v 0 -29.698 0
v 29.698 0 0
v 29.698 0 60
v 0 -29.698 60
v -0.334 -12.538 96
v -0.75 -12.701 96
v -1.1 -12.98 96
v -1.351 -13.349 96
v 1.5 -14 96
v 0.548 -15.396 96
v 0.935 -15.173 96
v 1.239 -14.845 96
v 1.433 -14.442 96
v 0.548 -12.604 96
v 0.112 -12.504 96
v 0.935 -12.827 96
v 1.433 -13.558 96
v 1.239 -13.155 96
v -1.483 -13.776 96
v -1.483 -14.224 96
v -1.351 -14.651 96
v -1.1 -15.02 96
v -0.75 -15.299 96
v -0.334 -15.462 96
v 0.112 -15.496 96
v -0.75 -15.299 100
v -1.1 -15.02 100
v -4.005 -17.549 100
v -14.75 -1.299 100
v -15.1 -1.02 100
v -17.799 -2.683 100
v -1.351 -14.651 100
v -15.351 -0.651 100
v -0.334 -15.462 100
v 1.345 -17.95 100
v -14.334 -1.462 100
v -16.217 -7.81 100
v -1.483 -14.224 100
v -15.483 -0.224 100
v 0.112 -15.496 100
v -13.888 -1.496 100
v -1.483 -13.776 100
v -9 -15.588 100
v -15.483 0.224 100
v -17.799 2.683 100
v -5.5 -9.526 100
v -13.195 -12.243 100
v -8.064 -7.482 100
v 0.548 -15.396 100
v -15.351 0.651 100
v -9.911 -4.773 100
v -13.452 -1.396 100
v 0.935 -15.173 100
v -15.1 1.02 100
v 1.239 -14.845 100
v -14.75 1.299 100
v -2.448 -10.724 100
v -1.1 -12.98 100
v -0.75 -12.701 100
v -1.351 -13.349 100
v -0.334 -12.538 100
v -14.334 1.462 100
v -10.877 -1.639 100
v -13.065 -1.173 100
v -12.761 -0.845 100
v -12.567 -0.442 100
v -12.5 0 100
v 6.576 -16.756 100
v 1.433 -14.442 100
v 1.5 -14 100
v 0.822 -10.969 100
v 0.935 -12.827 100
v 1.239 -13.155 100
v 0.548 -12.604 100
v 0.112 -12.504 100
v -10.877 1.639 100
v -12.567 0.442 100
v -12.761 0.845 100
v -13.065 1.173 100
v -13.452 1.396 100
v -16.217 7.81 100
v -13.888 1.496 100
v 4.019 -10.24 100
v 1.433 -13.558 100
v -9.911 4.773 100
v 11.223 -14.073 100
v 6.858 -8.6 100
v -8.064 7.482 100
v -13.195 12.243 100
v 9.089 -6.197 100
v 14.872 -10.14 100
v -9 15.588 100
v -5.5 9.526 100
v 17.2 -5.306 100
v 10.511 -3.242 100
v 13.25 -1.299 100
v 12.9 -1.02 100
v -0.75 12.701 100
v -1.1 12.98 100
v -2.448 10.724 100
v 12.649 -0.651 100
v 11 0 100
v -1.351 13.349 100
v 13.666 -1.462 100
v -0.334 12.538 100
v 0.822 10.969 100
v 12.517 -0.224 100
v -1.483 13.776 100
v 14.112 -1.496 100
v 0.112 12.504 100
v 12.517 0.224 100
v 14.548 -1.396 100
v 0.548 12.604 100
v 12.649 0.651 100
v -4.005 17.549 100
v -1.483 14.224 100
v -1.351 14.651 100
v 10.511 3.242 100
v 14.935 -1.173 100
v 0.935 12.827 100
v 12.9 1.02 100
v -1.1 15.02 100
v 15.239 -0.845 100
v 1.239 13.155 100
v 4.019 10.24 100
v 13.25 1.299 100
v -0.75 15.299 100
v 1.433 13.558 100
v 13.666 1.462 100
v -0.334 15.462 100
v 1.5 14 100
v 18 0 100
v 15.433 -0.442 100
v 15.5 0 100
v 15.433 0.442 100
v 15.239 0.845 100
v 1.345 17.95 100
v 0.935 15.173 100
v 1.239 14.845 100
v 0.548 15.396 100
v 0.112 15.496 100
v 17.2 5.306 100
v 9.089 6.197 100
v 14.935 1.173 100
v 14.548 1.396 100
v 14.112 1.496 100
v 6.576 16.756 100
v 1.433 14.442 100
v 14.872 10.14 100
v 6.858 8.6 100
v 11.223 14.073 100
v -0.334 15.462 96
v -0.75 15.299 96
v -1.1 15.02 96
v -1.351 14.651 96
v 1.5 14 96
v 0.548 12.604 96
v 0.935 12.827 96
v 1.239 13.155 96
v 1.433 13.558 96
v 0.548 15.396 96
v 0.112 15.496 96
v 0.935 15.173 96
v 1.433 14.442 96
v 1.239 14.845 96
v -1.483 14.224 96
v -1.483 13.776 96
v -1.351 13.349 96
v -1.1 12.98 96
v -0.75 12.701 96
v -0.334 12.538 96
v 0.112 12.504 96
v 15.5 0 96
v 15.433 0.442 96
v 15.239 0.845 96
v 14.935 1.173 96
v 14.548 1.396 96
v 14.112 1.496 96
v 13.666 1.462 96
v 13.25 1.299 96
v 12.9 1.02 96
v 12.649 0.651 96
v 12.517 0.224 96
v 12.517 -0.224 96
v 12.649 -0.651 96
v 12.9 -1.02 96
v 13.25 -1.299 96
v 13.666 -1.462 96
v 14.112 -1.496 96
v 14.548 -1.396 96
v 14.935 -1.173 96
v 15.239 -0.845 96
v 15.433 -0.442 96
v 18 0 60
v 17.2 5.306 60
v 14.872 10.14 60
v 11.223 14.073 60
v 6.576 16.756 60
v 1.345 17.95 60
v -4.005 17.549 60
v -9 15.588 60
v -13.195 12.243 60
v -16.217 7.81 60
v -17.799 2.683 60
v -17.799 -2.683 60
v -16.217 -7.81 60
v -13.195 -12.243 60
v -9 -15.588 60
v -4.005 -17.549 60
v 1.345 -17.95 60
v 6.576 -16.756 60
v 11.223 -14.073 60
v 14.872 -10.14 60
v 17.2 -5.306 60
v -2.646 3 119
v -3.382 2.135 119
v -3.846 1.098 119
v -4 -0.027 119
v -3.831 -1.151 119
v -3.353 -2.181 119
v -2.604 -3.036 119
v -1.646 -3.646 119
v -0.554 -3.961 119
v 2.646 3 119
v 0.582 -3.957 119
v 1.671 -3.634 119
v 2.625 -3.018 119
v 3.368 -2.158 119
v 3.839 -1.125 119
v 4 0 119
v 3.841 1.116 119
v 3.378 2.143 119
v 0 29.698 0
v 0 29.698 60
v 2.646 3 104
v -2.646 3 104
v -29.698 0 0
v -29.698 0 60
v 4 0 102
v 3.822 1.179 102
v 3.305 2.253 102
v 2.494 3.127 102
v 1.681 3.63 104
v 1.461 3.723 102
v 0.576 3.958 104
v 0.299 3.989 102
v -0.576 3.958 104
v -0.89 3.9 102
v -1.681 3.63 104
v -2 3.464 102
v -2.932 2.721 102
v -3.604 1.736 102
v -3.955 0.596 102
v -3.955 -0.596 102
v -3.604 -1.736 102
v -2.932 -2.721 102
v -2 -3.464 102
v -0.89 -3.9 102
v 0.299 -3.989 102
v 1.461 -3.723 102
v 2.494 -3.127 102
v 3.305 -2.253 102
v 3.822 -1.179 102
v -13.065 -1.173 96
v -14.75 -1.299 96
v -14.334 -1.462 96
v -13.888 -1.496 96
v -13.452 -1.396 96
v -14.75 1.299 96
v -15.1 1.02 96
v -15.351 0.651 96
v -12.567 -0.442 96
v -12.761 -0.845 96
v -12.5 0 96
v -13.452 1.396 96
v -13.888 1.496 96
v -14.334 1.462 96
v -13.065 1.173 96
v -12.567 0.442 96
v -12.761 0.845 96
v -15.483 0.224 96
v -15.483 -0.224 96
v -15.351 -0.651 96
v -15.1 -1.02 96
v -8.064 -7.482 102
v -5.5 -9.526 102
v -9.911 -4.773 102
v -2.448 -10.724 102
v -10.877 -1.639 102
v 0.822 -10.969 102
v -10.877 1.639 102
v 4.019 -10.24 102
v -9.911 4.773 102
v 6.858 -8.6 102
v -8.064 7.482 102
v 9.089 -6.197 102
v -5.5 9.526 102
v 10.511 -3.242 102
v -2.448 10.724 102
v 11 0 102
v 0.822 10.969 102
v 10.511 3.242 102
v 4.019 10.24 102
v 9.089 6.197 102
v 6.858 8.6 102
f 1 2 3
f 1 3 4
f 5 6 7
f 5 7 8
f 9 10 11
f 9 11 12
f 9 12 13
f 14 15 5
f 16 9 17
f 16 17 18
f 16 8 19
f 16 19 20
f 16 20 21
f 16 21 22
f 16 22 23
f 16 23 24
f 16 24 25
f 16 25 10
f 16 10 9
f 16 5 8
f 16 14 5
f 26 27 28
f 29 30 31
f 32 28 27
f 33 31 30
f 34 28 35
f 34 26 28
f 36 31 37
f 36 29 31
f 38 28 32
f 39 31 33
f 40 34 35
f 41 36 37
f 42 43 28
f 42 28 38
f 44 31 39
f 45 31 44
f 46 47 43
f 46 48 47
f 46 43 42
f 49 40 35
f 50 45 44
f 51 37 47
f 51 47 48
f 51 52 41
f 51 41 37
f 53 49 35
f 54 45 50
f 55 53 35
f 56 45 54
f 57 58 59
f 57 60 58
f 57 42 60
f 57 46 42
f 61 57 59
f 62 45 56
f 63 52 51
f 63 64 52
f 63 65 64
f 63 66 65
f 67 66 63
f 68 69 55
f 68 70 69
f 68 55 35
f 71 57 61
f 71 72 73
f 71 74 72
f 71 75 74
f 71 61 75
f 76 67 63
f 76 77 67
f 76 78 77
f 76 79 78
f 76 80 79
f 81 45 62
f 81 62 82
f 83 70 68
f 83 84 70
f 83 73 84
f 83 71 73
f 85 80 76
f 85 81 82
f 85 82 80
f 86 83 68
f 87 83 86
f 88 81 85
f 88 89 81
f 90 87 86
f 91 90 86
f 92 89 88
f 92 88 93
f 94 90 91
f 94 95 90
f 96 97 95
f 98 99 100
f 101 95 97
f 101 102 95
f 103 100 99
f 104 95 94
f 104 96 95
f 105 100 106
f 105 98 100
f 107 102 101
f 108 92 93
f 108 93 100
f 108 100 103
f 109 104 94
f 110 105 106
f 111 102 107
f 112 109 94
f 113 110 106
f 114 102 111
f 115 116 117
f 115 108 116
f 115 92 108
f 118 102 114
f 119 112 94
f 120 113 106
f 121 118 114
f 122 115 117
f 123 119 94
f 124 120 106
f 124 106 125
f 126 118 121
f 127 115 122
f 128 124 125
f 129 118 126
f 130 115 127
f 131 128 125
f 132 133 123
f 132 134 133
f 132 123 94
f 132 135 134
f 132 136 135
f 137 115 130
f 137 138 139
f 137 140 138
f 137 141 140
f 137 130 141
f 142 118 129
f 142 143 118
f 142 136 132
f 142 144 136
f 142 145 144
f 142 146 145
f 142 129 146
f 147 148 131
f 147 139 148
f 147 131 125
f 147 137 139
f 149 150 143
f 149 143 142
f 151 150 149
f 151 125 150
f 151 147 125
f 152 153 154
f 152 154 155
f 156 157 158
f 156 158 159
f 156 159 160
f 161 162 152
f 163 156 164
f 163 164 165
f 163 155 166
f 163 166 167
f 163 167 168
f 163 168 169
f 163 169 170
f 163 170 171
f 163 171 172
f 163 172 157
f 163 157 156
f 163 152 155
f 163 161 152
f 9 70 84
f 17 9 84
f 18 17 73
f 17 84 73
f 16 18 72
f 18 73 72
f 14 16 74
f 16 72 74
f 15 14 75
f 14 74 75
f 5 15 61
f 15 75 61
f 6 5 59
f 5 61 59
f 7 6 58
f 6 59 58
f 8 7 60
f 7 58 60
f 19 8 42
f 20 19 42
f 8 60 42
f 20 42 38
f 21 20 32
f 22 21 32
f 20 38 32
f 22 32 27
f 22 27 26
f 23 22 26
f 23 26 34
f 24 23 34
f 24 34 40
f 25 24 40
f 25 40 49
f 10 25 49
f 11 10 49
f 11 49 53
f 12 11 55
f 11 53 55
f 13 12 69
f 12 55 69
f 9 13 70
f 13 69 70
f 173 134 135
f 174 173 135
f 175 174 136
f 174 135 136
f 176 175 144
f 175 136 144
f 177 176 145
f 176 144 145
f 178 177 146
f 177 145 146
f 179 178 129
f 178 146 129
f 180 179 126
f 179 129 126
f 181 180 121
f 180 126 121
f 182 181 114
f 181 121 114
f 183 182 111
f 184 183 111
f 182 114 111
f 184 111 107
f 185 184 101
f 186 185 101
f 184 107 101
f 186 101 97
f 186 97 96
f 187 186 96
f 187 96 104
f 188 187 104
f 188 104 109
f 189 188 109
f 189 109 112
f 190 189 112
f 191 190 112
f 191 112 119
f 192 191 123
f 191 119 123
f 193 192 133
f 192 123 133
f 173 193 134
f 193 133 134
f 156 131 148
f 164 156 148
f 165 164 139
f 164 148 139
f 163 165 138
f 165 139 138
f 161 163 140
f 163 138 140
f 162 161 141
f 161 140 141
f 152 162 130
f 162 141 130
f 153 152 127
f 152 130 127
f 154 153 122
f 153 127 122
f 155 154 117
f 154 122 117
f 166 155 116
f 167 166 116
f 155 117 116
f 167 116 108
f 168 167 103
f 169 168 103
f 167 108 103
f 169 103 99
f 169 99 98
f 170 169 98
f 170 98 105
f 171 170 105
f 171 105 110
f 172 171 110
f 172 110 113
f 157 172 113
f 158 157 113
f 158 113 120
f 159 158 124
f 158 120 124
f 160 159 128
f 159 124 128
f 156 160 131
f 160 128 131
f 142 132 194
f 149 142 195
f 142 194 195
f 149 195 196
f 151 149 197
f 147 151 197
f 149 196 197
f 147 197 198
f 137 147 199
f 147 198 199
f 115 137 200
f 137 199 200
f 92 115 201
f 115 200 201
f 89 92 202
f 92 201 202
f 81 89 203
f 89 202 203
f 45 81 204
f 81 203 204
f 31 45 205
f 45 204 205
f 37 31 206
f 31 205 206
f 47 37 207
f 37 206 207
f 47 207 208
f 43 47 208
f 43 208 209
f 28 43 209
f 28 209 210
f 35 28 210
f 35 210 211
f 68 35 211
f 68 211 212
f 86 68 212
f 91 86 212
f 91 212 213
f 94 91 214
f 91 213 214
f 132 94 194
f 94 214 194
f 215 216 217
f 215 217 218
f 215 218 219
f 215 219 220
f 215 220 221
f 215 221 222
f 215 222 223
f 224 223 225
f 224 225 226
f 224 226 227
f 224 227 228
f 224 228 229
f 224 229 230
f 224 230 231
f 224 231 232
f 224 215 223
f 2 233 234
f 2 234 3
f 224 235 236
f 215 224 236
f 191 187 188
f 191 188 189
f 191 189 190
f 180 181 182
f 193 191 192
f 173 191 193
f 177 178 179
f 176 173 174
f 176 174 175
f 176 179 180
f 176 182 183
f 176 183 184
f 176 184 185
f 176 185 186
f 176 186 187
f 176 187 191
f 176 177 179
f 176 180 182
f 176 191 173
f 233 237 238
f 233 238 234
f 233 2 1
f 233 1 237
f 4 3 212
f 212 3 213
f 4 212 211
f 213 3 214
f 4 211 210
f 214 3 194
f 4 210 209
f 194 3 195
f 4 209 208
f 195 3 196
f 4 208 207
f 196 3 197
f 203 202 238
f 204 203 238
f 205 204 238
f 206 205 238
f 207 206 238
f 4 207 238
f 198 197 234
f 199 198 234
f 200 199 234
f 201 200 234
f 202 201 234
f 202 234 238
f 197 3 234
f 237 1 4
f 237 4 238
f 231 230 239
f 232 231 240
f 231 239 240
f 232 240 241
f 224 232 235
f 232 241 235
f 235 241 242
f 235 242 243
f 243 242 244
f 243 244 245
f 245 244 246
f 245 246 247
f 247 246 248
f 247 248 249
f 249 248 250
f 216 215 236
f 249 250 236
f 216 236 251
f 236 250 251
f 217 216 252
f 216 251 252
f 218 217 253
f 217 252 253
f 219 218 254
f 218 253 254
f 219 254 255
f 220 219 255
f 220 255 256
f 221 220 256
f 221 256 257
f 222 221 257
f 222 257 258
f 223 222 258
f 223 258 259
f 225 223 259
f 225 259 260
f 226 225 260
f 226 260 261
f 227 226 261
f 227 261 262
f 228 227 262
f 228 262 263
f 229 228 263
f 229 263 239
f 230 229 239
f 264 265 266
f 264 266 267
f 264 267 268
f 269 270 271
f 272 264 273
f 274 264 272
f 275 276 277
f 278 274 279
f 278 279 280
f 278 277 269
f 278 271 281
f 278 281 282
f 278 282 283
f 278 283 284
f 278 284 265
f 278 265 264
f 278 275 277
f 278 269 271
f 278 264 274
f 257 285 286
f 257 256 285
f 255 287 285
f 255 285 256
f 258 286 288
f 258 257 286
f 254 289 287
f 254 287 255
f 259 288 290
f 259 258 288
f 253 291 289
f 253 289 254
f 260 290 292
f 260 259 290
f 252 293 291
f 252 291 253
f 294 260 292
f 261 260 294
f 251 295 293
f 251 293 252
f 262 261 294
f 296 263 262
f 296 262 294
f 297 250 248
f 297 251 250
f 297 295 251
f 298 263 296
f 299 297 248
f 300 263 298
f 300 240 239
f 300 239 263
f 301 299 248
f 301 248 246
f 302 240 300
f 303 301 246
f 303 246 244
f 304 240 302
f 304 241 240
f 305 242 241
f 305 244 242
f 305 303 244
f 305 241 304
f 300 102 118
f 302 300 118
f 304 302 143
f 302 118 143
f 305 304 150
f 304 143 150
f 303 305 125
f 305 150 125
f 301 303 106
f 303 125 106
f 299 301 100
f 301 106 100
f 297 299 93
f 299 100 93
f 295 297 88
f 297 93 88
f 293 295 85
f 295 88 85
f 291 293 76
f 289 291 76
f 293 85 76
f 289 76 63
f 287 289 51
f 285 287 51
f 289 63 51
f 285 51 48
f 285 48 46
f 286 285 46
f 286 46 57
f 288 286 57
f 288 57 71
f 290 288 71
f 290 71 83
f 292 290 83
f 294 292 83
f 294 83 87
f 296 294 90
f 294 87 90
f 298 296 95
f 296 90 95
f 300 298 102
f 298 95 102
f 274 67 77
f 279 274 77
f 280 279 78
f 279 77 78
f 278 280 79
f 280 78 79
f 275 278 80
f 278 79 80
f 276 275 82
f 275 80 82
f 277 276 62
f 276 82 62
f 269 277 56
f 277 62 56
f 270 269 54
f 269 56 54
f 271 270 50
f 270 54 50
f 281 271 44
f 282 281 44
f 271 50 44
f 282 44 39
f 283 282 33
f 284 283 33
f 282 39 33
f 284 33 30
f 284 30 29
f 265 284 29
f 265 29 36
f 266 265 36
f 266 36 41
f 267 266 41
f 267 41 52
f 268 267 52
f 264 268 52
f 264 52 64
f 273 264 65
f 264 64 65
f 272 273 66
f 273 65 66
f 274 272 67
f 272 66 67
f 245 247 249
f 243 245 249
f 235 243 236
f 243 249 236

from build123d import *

# Parameters (mm, degrees)
EXTRUDE_1_DEPTH     = 60
SKETCH_2_R          = 18
EXTRUDE_2_DEPTH     = 40
SKETCH_3_R          = 11
EXTRUDE_3_DEPTH     = 2
SKETCH_4_R          = 4
EXTRUDE_4_DEPTH     = 17
SKETCH_5_R          = 1.5
CUT_EXTRUDE_1_DEPTH = 4
CUT_EXTRUDE_START   = -15
CUT_EXTRUDE_2_DEPTH = 15


with BuildPart() as part:
    # 草图1 → 凸台-拉伸1 (new body)
    with BuildSketch(Plane.XY):
        Polygon((-29.69848481, 0), (0, 29.69848481), (29.69848481, 0), (0, -29.69848481), align=None)
    extrude(amount=EXTRUDE_1_DEPTH)

    # 草图2 → 凸台-拉伸2 (add)
    with BuildSketch(Plane.XY.offset(60)):
        Circle(SKETCH_2_R)
    extrude(amount=EXTRUDE_2_DEPTH)

    # 草图3 → 凸台-拉伸3 (add)
    with BuildSketch(Plane.XY.offset(100)):
        Circle(SKETCH_3_R)
    extrude(amount=EXTRUDE_3_DEPTH)

    # 草图4 → 凸台-拉伸4 (add)
    with BuildSketch(Plane.XY.offset(102)):
        Circle(SKETCH_4_R)
    extrude(amount=EXTRUDE_4_DEPTH)

    # 草图5 → 切除-拉伸1 (cut)
    with BuildSketch(Plane.XY.offset(100)):
        with Locations((0, 14)):
            Circle(SKETCH_5_R)
        with Locations((14, 0)):
            Circle(SKETCH_5_R)
        with Locations((0, -14)):
            Circle(SKETCH_5_R)
        with Locations((-14, 0)):
            Circle(SKETCH_5_R)
    extrude(amount=-CUT_EXTRUDE_1_DEPTH, mode=Mode.SUBTRACT)

    # 草图6 → 切除-拉伸2 (cut)
    with BuildSketch(Plane.XY.offset(119).offset(CUT_EXTRUDE_START)):
        with BuildLine():
            Line((2.645751311, 3), (-2.645751311, 3))
            ThreePointArc((-2.645751311, 3), (0, 4), (2.645751311, 3))
        make_face()
    extrude(amount=CUT_EXTRUDE_2_DEPTH, mode=Mode.SUBTRACT)


solid = part.part
